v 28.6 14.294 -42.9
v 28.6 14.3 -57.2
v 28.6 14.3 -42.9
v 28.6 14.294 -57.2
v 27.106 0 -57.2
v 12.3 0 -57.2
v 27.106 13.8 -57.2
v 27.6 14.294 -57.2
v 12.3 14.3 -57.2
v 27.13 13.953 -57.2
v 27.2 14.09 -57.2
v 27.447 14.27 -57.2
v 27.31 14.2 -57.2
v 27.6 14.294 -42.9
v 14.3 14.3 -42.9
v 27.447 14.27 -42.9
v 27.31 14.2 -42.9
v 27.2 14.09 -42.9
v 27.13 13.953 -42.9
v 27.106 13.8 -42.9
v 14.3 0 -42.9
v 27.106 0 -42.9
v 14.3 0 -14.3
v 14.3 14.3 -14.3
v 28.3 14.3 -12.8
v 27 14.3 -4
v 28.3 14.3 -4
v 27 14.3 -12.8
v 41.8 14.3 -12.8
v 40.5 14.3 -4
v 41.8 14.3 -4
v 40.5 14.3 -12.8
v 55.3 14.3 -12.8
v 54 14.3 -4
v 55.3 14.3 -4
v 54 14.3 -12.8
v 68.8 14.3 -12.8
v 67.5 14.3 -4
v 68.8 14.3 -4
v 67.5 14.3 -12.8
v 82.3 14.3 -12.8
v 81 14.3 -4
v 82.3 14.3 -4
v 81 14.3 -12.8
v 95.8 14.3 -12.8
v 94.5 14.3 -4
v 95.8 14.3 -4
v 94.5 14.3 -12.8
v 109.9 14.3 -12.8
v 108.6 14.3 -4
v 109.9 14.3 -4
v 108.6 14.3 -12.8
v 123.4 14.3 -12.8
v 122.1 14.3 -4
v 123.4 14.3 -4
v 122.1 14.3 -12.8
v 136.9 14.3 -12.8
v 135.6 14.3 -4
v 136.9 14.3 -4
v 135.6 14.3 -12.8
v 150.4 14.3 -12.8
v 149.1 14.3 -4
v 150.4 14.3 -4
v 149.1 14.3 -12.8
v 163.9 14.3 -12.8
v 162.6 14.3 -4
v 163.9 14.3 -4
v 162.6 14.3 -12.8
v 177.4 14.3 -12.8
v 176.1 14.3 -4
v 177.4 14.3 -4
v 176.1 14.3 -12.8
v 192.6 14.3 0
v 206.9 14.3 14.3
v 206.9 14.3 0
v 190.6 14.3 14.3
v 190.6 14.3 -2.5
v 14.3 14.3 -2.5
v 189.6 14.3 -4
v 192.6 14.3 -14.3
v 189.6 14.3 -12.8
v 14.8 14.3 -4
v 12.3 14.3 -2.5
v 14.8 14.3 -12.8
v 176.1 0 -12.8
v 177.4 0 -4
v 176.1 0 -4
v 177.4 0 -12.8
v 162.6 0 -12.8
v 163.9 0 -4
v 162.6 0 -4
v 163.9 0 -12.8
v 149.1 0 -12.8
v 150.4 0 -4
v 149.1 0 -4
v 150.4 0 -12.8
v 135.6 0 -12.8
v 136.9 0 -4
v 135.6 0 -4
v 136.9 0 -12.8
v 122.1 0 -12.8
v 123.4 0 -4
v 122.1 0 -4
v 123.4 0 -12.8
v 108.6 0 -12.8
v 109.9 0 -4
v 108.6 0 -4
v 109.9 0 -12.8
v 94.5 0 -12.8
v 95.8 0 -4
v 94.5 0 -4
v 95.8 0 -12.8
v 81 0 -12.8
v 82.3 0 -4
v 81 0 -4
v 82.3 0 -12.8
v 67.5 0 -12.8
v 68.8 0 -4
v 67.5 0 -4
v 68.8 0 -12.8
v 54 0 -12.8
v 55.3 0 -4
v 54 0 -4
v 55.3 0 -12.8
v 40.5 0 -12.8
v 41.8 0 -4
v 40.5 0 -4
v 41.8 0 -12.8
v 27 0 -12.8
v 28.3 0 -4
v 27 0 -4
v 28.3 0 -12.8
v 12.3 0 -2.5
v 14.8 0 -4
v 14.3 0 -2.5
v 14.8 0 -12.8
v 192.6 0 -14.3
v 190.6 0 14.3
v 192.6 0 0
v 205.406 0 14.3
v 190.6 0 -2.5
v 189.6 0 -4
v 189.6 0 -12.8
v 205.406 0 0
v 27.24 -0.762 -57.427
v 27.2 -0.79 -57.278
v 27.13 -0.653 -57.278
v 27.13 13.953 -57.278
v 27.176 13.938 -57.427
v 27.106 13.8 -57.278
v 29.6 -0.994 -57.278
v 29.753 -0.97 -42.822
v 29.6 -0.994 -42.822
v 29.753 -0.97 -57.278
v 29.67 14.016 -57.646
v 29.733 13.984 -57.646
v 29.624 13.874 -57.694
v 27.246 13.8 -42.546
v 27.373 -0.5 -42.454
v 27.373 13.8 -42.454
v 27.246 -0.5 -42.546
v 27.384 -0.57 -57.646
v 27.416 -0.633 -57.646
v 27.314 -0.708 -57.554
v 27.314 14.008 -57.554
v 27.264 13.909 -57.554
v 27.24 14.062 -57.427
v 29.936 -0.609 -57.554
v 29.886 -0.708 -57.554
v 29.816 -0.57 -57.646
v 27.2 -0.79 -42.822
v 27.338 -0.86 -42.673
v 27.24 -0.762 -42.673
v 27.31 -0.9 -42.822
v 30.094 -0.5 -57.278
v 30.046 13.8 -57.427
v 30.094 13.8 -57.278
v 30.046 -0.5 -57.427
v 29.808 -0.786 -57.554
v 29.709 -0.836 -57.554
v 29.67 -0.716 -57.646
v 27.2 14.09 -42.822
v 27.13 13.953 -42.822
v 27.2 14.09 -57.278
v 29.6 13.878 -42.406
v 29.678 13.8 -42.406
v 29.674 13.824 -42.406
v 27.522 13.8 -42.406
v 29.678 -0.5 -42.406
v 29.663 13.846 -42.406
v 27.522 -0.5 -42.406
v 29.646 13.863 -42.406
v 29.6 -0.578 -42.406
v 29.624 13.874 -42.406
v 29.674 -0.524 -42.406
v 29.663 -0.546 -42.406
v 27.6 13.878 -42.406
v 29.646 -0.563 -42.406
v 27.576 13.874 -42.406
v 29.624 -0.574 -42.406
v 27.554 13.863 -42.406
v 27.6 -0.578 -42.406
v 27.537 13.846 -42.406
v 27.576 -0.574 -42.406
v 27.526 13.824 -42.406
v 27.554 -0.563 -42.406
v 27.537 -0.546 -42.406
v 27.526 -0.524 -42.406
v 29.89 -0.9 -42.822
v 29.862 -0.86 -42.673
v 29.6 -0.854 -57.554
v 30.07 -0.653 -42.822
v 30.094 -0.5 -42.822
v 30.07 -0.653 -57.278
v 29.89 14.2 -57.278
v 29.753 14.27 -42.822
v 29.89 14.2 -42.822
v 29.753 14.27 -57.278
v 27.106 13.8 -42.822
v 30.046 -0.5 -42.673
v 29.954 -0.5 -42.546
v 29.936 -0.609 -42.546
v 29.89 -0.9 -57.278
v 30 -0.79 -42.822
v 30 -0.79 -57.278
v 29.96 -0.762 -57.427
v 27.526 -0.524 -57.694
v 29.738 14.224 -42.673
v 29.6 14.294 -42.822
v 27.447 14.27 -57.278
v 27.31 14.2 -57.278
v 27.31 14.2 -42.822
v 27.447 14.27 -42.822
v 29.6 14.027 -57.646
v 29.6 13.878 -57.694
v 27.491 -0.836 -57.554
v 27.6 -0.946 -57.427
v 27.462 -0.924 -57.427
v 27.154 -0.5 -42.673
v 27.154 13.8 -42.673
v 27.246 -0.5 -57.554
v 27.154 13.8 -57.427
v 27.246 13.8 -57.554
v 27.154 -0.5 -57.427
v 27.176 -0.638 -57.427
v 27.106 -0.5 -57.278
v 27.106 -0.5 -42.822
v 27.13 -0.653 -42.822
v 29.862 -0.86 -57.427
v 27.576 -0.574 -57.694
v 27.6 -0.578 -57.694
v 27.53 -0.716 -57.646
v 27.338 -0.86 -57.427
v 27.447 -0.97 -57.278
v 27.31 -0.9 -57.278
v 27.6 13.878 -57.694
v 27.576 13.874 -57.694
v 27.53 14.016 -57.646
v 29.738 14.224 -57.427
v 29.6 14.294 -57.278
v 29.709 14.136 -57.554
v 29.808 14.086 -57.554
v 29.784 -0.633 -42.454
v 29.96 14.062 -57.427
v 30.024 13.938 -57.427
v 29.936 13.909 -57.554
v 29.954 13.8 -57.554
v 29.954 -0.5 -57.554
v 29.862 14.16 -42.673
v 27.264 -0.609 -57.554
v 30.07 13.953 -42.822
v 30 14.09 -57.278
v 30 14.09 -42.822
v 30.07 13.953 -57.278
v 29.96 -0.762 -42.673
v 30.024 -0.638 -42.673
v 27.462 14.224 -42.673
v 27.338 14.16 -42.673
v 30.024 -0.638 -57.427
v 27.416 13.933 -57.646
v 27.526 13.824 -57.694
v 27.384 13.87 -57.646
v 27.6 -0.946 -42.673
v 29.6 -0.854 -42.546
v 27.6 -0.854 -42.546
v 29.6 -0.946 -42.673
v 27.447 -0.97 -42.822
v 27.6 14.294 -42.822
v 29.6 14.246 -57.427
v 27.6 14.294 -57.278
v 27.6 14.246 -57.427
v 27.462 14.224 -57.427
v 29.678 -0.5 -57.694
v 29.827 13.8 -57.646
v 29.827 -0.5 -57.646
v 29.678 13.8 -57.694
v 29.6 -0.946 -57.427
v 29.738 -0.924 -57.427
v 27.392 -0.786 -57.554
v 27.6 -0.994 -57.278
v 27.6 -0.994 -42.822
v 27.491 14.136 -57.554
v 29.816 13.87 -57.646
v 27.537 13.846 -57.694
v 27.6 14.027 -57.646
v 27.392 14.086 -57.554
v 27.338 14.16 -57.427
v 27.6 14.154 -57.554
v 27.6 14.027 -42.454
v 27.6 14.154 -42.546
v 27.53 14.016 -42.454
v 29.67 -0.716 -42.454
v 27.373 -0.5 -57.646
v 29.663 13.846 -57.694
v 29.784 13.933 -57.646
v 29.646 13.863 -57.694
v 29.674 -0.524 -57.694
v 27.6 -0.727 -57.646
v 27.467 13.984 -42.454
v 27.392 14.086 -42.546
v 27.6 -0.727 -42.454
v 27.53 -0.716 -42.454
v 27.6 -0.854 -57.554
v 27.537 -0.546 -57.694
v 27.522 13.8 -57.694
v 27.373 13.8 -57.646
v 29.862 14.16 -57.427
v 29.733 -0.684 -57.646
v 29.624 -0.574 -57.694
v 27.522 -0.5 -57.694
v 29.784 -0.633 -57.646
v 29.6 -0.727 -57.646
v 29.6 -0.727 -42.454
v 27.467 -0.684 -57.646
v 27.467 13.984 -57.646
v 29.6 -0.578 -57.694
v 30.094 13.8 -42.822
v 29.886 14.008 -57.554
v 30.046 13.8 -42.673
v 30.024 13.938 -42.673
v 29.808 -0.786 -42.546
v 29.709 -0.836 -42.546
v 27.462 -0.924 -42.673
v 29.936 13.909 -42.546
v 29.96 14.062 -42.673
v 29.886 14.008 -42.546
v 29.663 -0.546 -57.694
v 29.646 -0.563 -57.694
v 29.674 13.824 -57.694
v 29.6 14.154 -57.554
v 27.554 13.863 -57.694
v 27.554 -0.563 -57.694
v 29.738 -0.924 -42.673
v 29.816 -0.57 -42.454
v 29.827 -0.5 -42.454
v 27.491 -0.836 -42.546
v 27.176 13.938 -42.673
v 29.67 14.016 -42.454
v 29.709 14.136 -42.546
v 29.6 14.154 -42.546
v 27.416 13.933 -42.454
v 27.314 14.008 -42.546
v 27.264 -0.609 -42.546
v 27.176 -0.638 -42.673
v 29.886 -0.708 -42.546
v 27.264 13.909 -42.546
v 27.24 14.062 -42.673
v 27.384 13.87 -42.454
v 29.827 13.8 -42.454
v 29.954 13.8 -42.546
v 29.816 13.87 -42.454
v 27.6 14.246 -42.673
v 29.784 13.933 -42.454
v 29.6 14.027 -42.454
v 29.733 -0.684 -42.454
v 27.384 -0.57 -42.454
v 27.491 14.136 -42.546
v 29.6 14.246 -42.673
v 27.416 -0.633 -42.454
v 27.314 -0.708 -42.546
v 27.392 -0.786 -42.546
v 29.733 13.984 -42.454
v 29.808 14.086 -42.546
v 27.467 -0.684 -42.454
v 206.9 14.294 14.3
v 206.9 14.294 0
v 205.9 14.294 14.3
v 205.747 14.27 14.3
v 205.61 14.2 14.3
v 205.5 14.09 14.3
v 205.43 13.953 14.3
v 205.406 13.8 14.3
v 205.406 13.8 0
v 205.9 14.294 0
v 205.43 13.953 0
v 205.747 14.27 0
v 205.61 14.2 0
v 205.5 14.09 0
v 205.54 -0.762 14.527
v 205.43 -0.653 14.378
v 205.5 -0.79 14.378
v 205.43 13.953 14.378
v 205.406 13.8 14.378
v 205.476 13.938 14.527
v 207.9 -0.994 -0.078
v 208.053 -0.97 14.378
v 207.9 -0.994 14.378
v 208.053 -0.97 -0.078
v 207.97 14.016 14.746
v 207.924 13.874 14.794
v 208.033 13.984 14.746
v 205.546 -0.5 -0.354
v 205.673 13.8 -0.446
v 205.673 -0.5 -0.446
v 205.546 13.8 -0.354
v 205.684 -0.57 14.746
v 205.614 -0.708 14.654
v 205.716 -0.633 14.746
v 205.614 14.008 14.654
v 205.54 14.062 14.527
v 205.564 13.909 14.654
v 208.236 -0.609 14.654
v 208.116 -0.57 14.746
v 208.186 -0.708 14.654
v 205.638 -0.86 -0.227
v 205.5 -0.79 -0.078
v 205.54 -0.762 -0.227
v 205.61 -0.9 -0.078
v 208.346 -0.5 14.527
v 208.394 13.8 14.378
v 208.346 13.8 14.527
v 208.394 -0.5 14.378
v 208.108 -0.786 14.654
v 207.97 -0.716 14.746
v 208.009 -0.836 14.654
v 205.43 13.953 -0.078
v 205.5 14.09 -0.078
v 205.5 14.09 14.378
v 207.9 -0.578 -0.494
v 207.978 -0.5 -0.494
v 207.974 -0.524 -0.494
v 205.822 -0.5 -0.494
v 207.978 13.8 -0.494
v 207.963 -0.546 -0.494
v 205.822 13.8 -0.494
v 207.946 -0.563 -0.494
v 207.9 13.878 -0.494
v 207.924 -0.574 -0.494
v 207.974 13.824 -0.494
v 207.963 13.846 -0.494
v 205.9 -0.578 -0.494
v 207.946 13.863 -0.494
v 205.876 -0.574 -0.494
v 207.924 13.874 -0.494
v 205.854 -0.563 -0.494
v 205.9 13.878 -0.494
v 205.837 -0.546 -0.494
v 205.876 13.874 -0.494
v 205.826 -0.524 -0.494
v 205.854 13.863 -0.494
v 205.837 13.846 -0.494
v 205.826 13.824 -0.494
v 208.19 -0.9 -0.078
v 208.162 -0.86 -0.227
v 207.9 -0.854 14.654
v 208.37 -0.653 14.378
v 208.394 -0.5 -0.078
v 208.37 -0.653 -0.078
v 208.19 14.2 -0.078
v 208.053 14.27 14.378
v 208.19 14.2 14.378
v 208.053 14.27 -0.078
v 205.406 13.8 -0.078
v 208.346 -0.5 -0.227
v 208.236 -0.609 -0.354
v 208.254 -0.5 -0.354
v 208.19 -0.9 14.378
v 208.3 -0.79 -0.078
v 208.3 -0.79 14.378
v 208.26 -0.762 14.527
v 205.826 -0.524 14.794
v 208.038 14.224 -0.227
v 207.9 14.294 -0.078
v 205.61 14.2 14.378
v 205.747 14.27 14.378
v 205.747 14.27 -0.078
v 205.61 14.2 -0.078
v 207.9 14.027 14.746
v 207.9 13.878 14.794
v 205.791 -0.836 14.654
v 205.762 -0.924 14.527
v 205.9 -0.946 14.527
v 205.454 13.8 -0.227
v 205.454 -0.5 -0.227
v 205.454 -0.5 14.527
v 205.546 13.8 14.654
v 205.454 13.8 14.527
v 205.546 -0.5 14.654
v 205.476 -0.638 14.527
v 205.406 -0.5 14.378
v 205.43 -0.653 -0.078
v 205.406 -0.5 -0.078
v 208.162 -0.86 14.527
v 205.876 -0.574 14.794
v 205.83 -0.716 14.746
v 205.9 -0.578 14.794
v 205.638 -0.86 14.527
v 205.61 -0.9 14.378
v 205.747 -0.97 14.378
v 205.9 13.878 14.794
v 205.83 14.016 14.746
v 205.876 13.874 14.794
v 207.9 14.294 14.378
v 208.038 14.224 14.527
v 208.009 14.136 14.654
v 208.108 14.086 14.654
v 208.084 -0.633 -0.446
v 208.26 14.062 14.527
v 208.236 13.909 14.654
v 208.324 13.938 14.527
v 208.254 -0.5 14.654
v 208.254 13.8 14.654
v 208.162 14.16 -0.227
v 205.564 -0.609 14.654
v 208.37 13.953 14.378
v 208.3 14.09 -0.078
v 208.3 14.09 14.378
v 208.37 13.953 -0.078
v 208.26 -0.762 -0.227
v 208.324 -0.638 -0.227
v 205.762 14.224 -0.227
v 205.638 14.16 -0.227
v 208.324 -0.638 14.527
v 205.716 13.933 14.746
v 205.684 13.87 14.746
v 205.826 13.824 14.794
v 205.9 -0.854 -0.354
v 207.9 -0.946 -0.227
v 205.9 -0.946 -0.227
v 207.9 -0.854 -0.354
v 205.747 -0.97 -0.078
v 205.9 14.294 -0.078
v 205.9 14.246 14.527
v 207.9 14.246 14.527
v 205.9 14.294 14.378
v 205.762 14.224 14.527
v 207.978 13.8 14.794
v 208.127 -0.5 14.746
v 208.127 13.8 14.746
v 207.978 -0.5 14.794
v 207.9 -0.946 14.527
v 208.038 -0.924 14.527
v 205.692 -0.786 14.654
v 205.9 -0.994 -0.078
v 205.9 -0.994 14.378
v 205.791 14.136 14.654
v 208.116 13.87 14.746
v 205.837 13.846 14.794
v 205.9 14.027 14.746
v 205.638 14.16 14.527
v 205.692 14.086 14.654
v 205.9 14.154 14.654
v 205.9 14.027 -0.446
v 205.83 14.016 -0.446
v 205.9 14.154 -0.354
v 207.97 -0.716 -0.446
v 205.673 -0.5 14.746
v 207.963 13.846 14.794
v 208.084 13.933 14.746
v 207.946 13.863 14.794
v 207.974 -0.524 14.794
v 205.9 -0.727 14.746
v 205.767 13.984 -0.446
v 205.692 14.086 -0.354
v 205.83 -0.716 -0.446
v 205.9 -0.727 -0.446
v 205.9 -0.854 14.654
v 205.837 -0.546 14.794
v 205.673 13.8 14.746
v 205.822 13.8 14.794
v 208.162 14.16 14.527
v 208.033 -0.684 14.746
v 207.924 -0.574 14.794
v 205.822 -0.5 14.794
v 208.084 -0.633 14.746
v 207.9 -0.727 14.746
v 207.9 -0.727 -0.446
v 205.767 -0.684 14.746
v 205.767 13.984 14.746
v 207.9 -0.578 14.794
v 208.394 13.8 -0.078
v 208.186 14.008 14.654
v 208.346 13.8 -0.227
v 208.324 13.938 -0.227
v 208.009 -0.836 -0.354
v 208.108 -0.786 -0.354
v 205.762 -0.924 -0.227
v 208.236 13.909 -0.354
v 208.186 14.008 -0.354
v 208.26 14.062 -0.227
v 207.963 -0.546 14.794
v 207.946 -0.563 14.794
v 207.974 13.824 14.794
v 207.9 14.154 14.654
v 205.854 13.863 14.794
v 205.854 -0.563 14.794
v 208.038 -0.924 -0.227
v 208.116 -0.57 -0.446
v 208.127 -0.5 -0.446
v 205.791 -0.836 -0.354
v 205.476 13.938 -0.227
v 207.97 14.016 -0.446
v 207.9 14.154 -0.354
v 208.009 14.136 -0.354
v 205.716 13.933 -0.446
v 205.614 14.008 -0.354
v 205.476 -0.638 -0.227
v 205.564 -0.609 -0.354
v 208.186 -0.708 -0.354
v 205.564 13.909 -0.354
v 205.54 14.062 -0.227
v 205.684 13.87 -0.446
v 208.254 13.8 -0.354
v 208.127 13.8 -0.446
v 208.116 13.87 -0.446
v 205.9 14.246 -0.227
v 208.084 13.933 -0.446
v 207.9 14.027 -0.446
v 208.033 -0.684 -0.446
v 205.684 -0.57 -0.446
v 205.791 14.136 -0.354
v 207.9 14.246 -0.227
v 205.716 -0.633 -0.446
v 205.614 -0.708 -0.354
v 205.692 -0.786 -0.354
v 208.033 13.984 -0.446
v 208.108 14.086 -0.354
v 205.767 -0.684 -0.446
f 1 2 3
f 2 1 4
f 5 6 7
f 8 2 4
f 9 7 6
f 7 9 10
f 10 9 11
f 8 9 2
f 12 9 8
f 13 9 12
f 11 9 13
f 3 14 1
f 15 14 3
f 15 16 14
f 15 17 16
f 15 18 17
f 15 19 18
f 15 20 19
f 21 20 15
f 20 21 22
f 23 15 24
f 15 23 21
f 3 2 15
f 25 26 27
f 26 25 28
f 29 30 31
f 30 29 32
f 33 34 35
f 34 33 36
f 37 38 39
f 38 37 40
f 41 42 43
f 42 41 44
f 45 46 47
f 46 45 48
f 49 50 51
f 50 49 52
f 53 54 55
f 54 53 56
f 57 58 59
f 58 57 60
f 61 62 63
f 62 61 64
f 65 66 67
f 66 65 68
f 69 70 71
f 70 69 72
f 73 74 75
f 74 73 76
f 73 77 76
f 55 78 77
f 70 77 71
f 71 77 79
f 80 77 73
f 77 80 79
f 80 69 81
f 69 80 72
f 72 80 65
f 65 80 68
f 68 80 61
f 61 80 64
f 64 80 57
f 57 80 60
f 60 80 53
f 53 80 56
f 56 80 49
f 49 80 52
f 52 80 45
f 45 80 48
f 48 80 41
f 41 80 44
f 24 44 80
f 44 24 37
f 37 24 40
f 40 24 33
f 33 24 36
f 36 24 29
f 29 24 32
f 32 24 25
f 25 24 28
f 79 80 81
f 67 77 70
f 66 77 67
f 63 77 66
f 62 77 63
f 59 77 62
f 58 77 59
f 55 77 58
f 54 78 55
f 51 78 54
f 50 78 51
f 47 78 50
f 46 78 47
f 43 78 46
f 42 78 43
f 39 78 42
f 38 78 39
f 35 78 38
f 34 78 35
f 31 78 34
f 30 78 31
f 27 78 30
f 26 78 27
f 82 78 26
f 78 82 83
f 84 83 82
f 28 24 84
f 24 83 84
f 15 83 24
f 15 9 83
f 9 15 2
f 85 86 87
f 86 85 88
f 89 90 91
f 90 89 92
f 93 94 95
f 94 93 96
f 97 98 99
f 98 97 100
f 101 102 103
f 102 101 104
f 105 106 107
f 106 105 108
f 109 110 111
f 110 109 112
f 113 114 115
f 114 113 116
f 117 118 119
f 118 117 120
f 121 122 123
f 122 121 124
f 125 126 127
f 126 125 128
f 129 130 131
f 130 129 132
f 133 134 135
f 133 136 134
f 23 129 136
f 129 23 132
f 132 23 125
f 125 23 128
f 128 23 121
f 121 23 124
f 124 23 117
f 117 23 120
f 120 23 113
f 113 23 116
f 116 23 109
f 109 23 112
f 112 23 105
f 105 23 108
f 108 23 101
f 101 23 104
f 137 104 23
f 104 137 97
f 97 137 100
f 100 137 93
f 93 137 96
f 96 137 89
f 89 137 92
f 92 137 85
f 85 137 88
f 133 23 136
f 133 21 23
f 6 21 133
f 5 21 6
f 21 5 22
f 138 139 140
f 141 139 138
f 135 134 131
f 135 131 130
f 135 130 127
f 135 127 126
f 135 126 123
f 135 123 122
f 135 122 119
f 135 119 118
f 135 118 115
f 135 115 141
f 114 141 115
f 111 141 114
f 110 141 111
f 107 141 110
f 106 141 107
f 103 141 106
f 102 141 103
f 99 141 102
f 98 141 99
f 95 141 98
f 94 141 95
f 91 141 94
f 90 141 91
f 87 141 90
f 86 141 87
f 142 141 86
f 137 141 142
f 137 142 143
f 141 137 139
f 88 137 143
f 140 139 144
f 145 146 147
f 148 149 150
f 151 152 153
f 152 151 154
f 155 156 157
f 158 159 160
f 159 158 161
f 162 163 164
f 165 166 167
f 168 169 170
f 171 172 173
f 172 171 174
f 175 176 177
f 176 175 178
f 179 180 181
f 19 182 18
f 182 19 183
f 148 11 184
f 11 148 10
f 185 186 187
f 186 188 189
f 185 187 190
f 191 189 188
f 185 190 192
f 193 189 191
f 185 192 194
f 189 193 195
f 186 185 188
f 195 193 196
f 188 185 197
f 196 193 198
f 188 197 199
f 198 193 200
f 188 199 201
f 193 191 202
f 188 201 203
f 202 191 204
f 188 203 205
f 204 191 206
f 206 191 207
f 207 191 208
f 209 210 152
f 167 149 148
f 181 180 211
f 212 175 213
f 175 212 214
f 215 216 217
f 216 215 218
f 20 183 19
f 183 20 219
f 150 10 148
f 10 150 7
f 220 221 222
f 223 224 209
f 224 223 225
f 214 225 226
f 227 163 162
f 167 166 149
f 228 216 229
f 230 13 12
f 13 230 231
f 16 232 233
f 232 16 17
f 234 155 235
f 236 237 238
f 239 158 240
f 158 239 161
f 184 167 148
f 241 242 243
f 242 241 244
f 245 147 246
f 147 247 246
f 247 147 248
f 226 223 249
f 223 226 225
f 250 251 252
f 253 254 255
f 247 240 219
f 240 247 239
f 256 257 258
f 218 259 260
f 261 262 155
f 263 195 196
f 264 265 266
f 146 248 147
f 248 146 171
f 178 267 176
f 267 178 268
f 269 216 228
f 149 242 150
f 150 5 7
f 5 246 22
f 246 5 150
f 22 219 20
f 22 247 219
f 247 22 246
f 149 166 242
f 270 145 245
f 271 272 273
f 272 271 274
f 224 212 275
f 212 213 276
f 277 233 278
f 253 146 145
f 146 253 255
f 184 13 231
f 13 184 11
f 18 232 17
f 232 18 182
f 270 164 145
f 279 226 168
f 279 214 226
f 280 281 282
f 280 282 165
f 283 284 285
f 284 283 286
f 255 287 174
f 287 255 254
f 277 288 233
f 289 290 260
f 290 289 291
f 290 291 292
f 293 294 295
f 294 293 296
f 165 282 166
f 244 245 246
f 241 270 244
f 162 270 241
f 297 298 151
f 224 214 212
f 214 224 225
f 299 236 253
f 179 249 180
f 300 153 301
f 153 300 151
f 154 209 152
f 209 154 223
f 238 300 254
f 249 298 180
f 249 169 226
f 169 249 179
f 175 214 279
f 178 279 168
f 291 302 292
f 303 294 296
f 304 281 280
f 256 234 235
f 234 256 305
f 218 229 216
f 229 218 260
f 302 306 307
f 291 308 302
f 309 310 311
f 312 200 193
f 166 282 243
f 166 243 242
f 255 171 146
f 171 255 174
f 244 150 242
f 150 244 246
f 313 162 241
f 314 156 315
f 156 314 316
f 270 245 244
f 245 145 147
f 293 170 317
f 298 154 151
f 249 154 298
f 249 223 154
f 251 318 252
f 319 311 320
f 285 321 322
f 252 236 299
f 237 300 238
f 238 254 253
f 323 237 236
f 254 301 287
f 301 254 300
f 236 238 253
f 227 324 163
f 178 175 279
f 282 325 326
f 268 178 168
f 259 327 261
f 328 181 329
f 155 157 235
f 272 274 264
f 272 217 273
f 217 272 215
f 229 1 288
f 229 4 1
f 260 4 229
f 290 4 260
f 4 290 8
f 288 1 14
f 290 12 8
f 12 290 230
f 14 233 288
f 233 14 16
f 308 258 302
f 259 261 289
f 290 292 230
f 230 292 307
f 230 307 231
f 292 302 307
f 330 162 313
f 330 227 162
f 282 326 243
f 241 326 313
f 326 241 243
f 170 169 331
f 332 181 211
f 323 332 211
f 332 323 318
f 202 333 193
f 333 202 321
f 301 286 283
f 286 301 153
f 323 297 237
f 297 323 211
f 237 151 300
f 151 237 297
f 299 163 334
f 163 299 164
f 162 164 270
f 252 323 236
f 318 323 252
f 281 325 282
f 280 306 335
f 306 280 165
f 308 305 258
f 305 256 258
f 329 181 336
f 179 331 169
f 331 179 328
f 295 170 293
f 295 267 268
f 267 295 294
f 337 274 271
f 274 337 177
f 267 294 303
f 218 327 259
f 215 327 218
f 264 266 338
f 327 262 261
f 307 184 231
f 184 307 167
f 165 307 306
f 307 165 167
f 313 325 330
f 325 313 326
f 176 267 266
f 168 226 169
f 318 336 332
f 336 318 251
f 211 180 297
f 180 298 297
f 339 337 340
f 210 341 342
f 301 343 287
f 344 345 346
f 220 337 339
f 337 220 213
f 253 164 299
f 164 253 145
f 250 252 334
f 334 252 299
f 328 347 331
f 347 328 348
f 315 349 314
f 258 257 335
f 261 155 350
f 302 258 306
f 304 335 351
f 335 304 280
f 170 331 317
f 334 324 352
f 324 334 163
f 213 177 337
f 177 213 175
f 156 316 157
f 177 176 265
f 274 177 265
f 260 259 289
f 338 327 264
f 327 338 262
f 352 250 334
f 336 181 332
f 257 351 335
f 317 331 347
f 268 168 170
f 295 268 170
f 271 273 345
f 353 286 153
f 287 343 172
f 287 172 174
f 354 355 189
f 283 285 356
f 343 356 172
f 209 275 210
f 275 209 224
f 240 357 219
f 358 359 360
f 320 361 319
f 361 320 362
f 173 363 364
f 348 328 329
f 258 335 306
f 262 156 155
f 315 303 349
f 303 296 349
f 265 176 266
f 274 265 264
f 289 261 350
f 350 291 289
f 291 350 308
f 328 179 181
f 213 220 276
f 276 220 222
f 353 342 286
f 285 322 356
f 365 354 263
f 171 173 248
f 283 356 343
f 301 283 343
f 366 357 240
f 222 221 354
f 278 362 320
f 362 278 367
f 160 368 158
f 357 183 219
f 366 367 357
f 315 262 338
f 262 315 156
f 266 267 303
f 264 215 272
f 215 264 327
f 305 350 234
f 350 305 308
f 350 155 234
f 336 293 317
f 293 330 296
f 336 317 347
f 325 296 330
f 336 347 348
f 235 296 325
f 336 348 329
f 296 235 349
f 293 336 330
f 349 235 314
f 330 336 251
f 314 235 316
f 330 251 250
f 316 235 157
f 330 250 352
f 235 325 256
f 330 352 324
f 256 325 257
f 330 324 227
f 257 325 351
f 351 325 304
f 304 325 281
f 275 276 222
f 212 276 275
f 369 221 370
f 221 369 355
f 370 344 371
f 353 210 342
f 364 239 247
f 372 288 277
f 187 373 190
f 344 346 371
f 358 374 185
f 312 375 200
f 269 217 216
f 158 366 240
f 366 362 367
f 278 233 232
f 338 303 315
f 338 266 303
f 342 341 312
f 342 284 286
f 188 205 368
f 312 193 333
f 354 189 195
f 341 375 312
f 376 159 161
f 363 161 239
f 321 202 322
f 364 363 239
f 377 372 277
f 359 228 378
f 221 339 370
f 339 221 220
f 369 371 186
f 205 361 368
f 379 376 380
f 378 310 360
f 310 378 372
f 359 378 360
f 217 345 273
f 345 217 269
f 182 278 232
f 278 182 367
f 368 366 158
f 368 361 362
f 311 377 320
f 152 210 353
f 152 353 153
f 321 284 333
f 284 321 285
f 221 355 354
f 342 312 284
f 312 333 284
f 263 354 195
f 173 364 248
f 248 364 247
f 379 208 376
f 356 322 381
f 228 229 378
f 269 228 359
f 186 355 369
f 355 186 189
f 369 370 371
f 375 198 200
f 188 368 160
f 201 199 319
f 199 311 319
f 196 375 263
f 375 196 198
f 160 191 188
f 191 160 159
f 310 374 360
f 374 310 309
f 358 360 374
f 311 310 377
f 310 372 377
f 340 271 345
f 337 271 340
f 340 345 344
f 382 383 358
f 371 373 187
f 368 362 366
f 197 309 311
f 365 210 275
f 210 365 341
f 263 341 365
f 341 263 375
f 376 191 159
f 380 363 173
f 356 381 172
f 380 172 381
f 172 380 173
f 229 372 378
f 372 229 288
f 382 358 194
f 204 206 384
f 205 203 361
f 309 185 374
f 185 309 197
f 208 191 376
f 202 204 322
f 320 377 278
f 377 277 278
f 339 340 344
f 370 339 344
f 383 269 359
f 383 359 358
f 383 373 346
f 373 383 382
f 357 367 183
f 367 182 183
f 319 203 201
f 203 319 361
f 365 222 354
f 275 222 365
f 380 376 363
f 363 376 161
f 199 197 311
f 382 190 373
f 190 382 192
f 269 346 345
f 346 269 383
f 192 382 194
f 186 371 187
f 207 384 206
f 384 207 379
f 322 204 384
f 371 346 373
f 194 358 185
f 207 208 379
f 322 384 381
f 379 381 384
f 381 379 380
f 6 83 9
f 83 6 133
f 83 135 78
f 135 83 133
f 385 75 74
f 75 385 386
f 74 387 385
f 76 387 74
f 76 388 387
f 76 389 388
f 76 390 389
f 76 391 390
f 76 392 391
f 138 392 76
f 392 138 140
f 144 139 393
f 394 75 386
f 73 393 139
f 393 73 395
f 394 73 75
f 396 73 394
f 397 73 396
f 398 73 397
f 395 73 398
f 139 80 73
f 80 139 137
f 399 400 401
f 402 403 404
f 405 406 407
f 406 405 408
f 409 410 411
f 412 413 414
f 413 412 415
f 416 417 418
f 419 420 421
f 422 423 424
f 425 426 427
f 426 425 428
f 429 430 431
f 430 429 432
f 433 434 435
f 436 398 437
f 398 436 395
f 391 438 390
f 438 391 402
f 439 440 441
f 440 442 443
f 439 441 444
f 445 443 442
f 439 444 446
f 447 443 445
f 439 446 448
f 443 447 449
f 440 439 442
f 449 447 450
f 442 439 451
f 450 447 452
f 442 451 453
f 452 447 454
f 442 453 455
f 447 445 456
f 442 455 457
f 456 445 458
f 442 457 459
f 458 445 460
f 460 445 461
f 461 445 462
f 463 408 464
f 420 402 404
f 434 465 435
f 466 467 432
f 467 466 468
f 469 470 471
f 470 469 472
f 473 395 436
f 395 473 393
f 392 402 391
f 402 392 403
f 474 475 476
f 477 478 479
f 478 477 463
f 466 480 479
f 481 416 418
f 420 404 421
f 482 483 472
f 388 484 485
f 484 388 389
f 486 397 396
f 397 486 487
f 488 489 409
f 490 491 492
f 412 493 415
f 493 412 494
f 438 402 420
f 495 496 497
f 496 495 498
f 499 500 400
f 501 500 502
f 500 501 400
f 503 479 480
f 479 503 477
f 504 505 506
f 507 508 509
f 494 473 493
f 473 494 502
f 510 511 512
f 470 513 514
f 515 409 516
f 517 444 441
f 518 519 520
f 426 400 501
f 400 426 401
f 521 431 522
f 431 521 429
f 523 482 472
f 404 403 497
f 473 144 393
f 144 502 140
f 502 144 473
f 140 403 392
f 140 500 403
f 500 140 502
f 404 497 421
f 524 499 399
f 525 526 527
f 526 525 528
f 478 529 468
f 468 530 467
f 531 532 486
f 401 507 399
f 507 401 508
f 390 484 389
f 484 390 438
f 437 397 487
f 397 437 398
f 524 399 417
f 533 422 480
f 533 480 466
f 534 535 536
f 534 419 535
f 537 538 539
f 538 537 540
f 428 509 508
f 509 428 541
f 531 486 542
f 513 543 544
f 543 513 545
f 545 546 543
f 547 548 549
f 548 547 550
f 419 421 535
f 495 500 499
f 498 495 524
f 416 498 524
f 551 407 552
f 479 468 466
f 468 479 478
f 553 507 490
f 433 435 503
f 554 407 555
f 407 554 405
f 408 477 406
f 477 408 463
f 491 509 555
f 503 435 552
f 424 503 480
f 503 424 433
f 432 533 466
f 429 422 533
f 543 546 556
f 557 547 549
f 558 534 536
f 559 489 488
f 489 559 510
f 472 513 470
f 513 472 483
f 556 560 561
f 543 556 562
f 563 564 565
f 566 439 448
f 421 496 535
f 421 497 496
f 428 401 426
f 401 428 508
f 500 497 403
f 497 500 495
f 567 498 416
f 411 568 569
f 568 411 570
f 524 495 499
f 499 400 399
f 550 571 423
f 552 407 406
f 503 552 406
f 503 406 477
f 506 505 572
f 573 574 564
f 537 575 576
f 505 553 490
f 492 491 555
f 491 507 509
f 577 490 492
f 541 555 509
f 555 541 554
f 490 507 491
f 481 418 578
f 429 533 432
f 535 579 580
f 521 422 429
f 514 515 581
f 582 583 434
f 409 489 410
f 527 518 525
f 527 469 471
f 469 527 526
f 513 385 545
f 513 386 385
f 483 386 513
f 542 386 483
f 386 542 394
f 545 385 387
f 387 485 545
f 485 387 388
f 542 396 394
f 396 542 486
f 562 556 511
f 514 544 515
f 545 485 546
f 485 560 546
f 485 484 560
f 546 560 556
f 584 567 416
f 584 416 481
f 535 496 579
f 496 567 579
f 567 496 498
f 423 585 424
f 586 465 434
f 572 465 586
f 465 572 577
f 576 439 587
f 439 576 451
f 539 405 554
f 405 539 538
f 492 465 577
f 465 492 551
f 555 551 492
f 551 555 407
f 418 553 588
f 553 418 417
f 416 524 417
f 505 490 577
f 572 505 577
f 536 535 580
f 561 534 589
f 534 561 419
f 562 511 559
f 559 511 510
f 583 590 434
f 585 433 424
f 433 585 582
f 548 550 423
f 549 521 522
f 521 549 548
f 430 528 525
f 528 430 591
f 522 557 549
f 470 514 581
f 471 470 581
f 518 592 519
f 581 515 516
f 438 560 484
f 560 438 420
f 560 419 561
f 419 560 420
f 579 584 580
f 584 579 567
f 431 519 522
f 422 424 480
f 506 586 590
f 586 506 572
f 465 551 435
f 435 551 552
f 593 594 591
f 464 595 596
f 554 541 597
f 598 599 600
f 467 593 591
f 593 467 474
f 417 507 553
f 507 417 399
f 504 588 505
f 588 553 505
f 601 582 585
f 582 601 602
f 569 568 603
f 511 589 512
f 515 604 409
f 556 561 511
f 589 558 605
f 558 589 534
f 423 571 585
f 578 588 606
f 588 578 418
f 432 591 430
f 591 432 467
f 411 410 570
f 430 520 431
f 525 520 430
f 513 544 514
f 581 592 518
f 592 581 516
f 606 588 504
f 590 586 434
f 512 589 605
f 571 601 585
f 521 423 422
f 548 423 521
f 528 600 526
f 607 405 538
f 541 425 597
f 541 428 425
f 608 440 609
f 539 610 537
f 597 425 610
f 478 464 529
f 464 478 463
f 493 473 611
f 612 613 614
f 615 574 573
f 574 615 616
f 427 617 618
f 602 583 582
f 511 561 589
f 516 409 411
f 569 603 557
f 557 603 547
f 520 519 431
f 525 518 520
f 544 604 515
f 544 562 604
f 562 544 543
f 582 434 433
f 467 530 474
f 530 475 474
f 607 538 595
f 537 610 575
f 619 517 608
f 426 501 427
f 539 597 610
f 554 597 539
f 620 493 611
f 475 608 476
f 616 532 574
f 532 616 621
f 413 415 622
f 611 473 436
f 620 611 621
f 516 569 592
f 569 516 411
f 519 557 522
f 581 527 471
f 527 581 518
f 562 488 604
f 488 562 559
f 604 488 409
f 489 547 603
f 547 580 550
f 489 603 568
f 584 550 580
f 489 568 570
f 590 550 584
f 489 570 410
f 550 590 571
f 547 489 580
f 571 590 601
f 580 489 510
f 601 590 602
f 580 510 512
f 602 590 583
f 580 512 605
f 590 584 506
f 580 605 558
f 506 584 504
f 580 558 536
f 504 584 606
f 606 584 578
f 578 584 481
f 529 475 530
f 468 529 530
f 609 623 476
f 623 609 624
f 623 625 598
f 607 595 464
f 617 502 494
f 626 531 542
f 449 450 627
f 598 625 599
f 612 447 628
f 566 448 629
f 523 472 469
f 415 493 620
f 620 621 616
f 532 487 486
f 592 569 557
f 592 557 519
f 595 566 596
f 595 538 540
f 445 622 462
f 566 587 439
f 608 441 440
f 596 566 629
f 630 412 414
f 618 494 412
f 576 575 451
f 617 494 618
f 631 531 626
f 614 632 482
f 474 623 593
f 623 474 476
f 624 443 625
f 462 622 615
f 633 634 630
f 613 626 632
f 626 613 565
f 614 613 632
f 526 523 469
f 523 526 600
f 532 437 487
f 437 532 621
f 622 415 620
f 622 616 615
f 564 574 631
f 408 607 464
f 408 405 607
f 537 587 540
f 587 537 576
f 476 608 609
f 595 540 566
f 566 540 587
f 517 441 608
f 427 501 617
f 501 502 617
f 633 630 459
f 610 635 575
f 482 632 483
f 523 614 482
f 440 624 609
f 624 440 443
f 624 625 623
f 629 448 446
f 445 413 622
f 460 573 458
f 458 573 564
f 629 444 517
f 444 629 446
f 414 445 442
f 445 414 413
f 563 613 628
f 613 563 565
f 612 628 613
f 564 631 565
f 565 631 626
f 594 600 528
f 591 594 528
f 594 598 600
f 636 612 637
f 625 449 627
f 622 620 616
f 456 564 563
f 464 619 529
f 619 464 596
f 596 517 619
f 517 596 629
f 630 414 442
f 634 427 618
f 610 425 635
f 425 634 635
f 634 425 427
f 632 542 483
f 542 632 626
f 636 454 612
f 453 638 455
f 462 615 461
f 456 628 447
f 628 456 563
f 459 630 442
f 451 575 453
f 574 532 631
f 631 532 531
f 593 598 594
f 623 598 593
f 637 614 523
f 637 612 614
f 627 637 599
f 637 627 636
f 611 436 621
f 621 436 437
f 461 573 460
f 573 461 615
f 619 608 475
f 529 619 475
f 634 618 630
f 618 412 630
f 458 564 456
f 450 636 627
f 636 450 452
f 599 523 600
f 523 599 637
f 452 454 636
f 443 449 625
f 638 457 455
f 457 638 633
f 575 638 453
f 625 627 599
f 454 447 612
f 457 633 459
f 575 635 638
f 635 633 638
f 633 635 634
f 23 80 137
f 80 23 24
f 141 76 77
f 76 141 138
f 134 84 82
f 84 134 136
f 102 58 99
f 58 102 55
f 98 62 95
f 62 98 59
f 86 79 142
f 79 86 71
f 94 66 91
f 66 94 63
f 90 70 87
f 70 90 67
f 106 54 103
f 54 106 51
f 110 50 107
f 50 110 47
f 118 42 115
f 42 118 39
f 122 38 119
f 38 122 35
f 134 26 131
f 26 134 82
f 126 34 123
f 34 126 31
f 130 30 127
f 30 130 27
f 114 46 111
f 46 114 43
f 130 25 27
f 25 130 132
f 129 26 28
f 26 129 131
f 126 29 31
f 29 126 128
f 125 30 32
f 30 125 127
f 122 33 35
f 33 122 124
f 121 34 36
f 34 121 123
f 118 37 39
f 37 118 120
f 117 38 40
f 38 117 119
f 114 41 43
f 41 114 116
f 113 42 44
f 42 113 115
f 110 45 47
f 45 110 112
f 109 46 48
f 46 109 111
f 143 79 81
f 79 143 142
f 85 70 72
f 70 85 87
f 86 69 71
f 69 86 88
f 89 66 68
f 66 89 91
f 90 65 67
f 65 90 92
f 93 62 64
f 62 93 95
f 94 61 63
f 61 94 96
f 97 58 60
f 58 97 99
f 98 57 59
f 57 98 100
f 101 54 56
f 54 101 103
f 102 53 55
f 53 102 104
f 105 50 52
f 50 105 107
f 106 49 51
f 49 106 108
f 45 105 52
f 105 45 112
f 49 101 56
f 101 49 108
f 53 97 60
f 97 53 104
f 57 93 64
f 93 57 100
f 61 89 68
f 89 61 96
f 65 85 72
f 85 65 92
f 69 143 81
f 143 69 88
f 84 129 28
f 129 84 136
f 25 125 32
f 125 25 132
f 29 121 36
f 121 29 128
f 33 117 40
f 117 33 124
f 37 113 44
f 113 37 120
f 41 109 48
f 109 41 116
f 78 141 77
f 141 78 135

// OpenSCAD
$fn = 20;

s = 14.3;

beam_up();
//beam_stright();

module beam_up() {
    translate([s, 0, -s*3]) 
        mirror([1, 0, 0]) 
            rotate([180, 0, 180]) {
                mount();
                translate([-2, 0, -s*3+2.5]) 
                    cube([2, s, s * 3-2]); 
            }
    
    translate([164 + s*2, 0, 0]) mount();

    translate([s, 0, -s]) cube([164+s, s, 1.5]);
    translate([s, 0, -4]) cube([164+s, s, 1.5]);
 
    beams();
    translate([204.4, 0, 0]) mirror([1, 0, 0]) beams();
}

module beam_stright() {
    translate([s, 0, 0]) mirror([1, 0, 0]) mount();
    translate([164 + s, 0, 0]) mount();

    translate([s, 0, -s]) cube([164, s, 1.5]);
    translate([s, 0, -4]) cube([164, s, 1.5]);

    beams();
    translate([192.5, 0, 0])mirror([1, 0, 0]) beams();
}

module beams() {
    for (i = [1:7]) {
        translate([13.5 * i, 0, -4]) 
            rotate([0, 90, 0]) 
                cube([s - 4, s, 1.3]);
    }
}

module mount() {
    cube(s);
    translate([s-1, -0.5, 0]) minkowski() {
        cube([2, s, s]);
        sphere(d = 1, $fn =20);
    }
    translate([-2, 0, -s]) cube([2, s, s * 2]); 
}
